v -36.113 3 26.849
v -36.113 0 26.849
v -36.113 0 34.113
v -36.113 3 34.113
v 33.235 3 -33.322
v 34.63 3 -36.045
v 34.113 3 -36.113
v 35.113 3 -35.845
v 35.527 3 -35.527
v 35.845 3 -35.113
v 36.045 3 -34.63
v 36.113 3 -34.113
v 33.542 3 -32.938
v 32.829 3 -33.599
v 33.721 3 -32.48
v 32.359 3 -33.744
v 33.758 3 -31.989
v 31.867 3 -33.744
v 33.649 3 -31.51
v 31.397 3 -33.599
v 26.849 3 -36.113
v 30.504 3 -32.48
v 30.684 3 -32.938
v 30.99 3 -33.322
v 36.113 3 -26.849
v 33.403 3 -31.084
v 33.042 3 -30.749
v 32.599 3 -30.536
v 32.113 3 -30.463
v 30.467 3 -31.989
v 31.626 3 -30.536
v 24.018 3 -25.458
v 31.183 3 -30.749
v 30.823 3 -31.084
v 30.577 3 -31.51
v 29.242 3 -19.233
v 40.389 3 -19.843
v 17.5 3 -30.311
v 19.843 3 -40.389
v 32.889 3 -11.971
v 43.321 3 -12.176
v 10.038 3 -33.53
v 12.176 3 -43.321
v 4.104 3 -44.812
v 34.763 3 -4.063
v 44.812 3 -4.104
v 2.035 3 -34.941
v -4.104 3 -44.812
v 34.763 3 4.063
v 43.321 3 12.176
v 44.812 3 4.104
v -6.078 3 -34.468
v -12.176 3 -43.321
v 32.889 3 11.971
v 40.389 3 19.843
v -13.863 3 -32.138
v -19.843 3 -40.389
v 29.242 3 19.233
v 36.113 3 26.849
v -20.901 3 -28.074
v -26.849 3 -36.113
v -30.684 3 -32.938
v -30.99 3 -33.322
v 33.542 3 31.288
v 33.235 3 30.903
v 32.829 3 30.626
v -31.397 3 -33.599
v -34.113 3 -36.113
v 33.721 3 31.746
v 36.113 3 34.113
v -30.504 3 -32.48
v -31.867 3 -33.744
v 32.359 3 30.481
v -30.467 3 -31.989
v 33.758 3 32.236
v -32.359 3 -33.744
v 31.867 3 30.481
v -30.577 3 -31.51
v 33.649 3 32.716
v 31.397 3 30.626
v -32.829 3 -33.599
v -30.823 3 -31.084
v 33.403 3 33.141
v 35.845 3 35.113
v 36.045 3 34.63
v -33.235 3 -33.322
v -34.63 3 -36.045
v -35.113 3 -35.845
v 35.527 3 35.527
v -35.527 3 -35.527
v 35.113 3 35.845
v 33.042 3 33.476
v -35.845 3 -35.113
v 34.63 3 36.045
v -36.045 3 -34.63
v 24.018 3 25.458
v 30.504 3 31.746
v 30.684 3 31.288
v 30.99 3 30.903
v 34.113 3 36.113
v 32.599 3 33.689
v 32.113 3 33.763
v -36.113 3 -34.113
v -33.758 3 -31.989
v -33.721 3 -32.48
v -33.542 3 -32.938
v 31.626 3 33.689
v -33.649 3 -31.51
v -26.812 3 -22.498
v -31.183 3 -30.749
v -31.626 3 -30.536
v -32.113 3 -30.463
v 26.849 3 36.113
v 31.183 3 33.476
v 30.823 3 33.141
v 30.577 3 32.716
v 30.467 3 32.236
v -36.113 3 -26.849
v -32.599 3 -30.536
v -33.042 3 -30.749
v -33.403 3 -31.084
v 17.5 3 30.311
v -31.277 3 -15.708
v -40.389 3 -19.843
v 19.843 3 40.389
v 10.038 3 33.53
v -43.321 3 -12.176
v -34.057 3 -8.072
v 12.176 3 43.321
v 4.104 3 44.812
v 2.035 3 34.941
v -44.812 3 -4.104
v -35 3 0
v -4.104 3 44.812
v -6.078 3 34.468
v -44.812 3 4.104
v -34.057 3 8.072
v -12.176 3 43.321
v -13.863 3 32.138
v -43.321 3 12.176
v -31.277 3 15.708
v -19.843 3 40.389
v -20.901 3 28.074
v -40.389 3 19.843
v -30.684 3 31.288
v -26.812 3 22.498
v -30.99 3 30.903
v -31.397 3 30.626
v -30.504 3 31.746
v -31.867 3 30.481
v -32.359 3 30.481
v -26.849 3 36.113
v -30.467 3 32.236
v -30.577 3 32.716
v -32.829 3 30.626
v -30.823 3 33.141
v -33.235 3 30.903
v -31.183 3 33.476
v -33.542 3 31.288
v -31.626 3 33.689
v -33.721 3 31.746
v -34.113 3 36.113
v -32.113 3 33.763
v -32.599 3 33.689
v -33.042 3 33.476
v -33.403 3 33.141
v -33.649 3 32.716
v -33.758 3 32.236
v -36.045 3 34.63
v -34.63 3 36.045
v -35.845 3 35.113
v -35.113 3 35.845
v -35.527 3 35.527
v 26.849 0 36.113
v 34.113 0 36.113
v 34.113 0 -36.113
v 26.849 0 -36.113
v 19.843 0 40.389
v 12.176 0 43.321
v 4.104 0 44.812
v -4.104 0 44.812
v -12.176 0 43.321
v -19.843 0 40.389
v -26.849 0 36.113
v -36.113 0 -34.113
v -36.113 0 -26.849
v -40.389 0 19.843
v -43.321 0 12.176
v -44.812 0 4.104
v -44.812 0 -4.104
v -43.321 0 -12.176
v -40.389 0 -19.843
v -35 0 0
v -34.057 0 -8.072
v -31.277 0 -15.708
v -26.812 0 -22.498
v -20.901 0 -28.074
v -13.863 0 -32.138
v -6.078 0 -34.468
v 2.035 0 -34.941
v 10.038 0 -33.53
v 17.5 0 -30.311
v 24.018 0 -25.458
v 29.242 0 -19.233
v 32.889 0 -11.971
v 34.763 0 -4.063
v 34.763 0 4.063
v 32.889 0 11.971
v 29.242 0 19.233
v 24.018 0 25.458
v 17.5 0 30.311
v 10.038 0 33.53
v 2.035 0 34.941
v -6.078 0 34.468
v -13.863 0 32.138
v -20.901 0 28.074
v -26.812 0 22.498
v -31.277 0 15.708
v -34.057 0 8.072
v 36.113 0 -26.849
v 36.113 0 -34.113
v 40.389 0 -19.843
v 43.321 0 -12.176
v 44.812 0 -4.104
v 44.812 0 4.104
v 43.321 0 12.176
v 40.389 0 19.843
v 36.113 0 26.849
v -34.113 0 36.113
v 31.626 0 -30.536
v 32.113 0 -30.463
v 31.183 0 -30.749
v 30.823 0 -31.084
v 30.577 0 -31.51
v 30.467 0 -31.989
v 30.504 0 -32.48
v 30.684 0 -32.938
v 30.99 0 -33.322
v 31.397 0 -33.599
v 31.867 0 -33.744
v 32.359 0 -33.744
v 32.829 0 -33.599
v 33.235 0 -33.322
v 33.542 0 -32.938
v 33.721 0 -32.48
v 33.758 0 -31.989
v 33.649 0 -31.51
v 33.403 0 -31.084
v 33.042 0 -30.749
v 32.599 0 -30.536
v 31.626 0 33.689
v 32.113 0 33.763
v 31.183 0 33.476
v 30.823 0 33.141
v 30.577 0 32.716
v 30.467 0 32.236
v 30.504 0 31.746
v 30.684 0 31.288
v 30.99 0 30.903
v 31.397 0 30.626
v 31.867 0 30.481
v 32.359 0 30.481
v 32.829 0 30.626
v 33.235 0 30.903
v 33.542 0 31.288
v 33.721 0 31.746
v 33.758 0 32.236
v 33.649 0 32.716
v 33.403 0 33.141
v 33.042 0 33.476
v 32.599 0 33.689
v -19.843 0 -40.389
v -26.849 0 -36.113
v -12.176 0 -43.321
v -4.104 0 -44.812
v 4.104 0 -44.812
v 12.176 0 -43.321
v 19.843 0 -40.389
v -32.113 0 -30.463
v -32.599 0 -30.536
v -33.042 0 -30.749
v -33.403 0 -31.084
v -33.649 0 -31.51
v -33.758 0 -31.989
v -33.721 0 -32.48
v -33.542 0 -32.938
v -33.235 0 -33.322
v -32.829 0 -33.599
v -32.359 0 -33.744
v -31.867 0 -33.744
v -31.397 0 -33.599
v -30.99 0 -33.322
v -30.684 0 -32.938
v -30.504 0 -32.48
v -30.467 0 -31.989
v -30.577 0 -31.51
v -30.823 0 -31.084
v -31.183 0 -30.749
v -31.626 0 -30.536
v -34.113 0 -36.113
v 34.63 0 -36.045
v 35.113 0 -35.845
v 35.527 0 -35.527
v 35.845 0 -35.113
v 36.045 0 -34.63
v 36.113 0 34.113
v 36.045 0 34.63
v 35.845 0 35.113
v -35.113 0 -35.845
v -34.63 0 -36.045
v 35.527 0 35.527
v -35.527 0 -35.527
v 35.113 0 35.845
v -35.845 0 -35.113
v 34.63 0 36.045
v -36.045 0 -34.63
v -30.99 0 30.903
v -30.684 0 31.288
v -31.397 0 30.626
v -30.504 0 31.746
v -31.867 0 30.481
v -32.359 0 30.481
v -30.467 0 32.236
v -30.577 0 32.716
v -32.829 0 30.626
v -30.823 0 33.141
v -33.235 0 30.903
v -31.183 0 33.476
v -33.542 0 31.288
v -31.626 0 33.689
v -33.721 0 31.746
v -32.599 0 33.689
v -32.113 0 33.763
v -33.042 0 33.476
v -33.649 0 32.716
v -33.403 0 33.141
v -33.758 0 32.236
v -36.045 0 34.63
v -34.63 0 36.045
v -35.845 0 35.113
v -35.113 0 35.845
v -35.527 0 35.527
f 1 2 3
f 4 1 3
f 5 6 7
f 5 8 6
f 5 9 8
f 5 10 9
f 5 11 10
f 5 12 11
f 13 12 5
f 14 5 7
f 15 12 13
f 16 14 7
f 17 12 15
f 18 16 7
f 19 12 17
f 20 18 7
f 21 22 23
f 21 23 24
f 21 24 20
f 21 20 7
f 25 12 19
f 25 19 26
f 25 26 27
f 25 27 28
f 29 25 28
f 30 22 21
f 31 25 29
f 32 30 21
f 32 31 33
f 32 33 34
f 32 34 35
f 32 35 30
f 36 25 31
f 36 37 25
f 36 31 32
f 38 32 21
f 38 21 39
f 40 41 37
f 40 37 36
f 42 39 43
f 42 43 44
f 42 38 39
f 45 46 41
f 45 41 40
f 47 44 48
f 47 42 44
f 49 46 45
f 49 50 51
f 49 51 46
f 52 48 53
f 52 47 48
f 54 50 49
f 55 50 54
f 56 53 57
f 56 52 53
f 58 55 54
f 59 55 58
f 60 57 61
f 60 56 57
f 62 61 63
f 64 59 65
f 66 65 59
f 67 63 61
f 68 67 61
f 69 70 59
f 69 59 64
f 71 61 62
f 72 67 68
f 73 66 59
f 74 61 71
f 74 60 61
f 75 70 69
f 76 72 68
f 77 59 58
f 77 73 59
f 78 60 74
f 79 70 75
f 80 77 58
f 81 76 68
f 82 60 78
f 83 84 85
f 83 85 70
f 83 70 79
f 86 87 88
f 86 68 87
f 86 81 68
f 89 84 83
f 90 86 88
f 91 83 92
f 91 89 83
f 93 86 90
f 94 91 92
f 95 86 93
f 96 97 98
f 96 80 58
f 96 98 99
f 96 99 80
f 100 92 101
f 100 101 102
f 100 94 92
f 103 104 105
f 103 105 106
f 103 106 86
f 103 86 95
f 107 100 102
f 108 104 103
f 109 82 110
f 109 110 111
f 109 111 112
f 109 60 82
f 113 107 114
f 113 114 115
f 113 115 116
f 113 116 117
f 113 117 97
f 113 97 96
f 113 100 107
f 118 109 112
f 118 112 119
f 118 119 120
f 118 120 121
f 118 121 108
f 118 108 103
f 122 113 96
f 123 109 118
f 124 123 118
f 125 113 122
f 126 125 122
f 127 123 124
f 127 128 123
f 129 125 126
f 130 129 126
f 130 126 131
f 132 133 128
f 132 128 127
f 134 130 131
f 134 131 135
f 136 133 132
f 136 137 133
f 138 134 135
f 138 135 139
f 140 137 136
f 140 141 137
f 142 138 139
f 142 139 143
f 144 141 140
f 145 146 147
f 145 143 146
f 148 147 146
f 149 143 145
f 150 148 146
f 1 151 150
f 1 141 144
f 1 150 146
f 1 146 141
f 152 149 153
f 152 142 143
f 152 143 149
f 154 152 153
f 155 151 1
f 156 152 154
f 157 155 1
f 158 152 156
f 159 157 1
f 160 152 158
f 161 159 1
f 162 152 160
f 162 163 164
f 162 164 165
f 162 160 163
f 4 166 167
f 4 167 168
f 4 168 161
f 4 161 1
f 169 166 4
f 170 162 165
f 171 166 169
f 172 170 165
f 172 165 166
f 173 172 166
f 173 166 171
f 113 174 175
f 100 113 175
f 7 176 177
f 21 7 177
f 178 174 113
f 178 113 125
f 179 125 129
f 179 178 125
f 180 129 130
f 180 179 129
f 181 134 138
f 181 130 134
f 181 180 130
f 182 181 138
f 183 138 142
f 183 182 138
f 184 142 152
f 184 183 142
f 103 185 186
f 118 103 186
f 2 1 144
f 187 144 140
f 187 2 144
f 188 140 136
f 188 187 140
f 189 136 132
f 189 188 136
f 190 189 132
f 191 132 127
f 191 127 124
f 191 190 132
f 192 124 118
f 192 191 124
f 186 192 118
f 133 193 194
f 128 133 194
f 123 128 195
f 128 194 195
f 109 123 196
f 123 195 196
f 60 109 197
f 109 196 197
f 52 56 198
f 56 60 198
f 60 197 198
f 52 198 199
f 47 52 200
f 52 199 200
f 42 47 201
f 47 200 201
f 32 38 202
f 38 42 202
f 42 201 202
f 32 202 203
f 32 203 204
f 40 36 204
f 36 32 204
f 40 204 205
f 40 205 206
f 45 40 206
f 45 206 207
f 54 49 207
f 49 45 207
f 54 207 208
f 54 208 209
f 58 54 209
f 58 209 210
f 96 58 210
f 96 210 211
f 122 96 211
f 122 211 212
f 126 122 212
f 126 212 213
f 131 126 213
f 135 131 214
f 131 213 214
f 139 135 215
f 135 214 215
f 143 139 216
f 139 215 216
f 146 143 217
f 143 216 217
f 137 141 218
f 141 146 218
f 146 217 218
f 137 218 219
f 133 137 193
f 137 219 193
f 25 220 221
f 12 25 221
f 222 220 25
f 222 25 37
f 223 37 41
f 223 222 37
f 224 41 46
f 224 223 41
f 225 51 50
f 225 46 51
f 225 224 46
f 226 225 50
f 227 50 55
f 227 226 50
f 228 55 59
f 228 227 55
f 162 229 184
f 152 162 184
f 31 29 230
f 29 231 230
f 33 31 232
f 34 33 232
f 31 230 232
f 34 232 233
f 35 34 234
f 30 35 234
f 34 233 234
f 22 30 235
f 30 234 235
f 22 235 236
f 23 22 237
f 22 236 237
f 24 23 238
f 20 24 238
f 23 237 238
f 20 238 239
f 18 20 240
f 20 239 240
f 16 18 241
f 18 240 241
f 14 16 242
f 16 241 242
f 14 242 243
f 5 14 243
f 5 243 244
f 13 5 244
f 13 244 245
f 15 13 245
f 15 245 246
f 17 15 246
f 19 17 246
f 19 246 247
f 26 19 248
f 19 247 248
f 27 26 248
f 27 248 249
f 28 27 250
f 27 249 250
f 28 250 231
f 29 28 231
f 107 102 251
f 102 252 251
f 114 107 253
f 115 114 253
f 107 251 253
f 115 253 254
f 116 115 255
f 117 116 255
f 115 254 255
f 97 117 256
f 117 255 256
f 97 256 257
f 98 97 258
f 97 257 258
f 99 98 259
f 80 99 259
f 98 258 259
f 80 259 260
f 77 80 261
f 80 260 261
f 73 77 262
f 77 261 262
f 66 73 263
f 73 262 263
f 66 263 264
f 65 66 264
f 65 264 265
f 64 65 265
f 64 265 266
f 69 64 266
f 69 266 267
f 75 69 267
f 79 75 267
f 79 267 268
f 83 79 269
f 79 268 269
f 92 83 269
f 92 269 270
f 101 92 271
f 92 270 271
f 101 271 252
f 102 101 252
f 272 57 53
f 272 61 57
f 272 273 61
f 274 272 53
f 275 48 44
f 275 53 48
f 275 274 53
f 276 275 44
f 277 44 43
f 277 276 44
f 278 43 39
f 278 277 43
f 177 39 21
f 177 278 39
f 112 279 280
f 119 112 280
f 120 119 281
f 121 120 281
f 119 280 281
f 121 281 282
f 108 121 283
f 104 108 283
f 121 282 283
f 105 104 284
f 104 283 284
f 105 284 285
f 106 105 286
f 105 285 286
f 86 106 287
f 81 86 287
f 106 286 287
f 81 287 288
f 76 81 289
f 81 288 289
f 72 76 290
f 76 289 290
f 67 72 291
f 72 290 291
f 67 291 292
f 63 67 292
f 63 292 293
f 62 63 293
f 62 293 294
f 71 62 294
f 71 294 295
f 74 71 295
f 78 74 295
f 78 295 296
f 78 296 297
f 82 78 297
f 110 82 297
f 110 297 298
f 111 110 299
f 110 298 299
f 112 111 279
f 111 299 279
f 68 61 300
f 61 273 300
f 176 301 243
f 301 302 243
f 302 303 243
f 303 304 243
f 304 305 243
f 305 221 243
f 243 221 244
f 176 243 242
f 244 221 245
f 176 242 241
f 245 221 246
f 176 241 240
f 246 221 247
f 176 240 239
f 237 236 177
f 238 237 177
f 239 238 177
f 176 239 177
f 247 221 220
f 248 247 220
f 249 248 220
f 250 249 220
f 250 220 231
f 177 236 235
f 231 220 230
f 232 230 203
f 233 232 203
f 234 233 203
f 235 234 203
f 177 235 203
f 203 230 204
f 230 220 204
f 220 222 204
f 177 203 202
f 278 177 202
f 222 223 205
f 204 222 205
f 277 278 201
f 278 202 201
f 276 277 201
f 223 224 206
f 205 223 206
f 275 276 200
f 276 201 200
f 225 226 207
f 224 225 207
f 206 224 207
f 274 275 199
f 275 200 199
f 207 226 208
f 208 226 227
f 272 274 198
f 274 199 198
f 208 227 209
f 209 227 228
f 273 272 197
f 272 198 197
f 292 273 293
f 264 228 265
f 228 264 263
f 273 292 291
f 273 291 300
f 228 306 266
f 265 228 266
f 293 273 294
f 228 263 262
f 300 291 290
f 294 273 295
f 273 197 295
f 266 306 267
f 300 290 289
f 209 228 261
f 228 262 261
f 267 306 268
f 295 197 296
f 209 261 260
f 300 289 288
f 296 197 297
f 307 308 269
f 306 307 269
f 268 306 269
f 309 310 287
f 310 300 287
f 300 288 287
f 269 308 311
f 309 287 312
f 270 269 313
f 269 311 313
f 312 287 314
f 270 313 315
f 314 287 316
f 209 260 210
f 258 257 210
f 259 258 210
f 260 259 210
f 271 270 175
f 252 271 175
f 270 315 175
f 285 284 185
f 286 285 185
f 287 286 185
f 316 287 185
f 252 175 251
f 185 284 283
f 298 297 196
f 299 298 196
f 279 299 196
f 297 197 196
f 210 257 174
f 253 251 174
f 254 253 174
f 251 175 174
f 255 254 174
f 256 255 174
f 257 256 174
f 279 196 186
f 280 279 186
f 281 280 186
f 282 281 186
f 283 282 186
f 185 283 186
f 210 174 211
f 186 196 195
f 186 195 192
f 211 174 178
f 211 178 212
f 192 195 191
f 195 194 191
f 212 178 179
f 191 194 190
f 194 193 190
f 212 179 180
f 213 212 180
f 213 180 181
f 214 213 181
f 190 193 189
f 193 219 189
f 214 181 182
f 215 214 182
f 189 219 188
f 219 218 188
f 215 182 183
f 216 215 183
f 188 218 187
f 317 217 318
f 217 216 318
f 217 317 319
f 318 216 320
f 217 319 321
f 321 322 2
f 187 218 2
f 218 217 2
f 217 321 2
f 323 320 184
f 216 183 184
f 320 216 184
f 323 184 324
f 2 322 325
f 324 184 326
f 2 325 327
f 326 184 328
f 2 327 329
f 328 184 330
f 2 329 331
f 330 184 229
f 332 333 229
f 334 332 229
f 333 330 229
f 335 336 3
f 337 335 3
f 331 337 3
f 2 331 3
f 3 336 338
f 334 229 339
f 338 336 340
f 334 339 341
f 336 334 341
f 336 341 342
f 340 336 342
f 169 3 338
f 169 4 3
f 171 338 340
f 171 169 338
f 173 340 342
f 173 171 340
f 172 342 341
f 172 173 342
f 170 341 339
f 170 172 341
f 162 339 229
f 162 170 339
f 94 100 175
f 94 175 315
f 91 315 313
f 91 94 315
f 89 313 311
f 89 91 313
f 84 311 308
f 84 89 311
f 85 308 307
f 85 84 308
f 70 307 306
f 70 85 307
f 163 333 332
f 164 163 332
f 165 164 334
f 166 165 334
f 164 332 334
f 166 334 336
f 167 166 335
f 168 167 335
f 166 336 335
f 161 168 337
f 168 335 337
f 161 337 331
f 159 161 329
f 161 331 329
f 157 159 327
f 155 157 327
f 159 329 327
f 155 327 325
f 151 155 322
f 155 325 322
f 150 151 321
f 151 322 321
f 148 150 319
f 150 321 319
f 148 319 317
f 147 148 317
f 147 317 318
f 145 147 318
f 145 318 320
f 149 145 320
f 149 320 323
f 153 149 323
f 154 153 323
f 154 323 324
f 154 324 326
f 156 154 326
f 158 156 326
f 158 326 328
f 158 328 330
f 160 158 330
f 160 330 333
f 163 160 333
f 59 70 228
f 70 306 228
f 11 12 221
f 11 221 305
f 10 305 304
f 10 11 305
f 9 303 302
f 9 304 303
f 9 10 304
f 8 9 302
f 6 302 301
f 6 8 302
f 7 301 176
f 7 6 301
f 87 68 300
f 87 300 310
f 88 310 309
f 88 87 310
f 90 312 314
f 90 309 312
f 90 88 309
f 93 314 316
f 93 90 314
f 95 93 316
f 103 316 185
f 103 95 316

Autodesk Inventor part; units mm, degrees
ref_plane "YZ Plane" through (0, 0, 0) normal (1, 0, 0) x (0, 1, 0)
ref_plane "XZ Plane" through (0, 0, 0) normal (0, 1, 0) x (-1, 0, 0)
ref_plane "XY Plane" through (0, 0, 0) normal (0, 0, 1) x (1, 0, 0)
sketch "Skizze1" plane through (0, 0, 0) normal (0, 1, 0) x (-1, 0, 0)
  circle A0 centre (0, 0) radius 45
  circle A1 centre (0, 0) radius 35
  dimension "d0" = 90
  dimension "d1" = 70
extrude "Extrusion1" add sketch "Skizze1" along normal blind 3
sketch "Skizze6" plane through (0, 0, 0) normal (0, -1, 0) x (1, 0, 0)
  circle A0 centre (0, 0) radius 35 projected
  line L0 (-36.1127, -36.1127) -> (36.1127, -36.1127) construction
  line L1 (36.1127, -36.1127) -> (36.1127, 36.1127) construction
  line L2 (36.1127, 36.1127) -> (-36.1127, 36.1127) construction
  line L3 (-36.1127, 36.1127) -> (-36.1127, -36.1127) construction
  line L4 (-36.1127, -36.1127) -> (36.1127, 36.1127) construction
  line L5 (36.1127, -36.1127) -> (-36.1127, 36.1127) construction
  circle A1 centre (0, 0) radius 45 construction
  line L6 (-26.1127, 26.1127) -> (-36.1127, 26.1127)
  line L7 (-36.1127, 26.1127) -> (-36.1127, 36.1127)
  line L8 (-36.1127, 36.1127) -> (-26.1127, 36.1127)
  line L9 (-26.1127, 36.1127) -> (-26.1127, 26.1127)
  line L10 (-26.1127, 26.1127) -> (-36.1127, 36.1127) construction
  line L11 (-36.1127, 26.1127) -> (-26.1127, 36.1127) construction
  line L12 (-26.1127, -26.1127) -> (-26.1127, -36.1127)
  line L13 (-26.1127, -36.1127) -> (-36.1127, -36.1127)
  line L14 (-36.1127, -36.1127) -> (-36.1127, -26.1127)
  line L15 (-26.1127, -26.1127) -> (-36.1127, -36.1127) construction
  line L16 (-26.1127, -36.1127) -> (-36.1127, -26.1127) construction
  line L17 (-36.1127, -26.1127) -> (-26.1127, -26.1127)
  line L18 (26.1127, -26.1127) -> (36.1127, -26.1127)
  line L19 (36.1127, -26.1127) -> (36.1127, -36.1127)
  line L20 (36.1127, -36.1127) -> (26.1127, -36.1127)
  line L21 (26.1127, -26.1127) -> (36.1127, -36.1127) construction
  line L22 (36.1127, -26.1127) -> (26.1127, -36.1127) construction
  line L23 (26.1127, -36.1127) -> (26.1127, -26.1127)
  line L24 (26.1127, 26.1127) -> (26.1127, 36.1127)
  line L25 (26.1127, 36.1127) -> (36.1127, 36.1127)
  line L26 (36.1127, 36.1127) -> (36.1127, 26.1127)
  line L27 (26.1127, 26.1127) -> (36.1127, 36.1127) construction
  line L28 (26.1127, 36.1127) -> (36.1127, 26.1127) construction
  line L29 (36.1127, 26.1127) -> (26.1127, 26.1127)
  point P0 (-31.1127, 31.1127)
  point P1 (-31.1127, -31.1127)
  point P2 (31.1127, -31.1127)
  point P3 (31.1127, 31.1127)
  dimension "d54" = 44
  dimension "d55" = 10
  dimension "d56" = 10
  dimension "d59" = 360
extrude "Extrusion4" add sketch "Skizze6" against normal blind 3 contours L6 L7 L8 L9 | L12 L13 L14 L17 | L18 L19 L20 L23 | L24 L25 L26 L29
sketch "Skizze7" plane through (0, 3, 0) normal (0, 1, 0) x (1, 0, 0)
  line L0 (-36.1127, -26.8491) -> (-36.1127, -36.1127) projected
  line L1 (-36.1127, -36.1127) -> (-26.8491, -36.1127) projected
  point P0 (0, 0)
  point P1 (-32.1127, -32.1127)
  point P2 (32.1127, -32.1127)
  point P3 (32.1127, 32.1127)
  point P4 (-32.1127, 32.1127)
  dimension "d63" = 4
  dimension "d64" = 4
  dimension "d67" = 360
hole "Bohrung3" at (-32.1127, 3, 32.1127) at (32.1127, 3, 32.1127) at (32.1127, 3, -32.1127) at (-32.1127, 3, -32.1127) direction (0, -1, 0) diameter 3.3 end through all
fillet "Rundung1" radius 2 4 edges at (-36.1127, 1.5, 36.1127) (-36.1127, 1.5, -36.1127) (36.1127, 1.5, 36.1127) (36.1127, 1.5, -36.1127)
properties part number "LED_Ring"
